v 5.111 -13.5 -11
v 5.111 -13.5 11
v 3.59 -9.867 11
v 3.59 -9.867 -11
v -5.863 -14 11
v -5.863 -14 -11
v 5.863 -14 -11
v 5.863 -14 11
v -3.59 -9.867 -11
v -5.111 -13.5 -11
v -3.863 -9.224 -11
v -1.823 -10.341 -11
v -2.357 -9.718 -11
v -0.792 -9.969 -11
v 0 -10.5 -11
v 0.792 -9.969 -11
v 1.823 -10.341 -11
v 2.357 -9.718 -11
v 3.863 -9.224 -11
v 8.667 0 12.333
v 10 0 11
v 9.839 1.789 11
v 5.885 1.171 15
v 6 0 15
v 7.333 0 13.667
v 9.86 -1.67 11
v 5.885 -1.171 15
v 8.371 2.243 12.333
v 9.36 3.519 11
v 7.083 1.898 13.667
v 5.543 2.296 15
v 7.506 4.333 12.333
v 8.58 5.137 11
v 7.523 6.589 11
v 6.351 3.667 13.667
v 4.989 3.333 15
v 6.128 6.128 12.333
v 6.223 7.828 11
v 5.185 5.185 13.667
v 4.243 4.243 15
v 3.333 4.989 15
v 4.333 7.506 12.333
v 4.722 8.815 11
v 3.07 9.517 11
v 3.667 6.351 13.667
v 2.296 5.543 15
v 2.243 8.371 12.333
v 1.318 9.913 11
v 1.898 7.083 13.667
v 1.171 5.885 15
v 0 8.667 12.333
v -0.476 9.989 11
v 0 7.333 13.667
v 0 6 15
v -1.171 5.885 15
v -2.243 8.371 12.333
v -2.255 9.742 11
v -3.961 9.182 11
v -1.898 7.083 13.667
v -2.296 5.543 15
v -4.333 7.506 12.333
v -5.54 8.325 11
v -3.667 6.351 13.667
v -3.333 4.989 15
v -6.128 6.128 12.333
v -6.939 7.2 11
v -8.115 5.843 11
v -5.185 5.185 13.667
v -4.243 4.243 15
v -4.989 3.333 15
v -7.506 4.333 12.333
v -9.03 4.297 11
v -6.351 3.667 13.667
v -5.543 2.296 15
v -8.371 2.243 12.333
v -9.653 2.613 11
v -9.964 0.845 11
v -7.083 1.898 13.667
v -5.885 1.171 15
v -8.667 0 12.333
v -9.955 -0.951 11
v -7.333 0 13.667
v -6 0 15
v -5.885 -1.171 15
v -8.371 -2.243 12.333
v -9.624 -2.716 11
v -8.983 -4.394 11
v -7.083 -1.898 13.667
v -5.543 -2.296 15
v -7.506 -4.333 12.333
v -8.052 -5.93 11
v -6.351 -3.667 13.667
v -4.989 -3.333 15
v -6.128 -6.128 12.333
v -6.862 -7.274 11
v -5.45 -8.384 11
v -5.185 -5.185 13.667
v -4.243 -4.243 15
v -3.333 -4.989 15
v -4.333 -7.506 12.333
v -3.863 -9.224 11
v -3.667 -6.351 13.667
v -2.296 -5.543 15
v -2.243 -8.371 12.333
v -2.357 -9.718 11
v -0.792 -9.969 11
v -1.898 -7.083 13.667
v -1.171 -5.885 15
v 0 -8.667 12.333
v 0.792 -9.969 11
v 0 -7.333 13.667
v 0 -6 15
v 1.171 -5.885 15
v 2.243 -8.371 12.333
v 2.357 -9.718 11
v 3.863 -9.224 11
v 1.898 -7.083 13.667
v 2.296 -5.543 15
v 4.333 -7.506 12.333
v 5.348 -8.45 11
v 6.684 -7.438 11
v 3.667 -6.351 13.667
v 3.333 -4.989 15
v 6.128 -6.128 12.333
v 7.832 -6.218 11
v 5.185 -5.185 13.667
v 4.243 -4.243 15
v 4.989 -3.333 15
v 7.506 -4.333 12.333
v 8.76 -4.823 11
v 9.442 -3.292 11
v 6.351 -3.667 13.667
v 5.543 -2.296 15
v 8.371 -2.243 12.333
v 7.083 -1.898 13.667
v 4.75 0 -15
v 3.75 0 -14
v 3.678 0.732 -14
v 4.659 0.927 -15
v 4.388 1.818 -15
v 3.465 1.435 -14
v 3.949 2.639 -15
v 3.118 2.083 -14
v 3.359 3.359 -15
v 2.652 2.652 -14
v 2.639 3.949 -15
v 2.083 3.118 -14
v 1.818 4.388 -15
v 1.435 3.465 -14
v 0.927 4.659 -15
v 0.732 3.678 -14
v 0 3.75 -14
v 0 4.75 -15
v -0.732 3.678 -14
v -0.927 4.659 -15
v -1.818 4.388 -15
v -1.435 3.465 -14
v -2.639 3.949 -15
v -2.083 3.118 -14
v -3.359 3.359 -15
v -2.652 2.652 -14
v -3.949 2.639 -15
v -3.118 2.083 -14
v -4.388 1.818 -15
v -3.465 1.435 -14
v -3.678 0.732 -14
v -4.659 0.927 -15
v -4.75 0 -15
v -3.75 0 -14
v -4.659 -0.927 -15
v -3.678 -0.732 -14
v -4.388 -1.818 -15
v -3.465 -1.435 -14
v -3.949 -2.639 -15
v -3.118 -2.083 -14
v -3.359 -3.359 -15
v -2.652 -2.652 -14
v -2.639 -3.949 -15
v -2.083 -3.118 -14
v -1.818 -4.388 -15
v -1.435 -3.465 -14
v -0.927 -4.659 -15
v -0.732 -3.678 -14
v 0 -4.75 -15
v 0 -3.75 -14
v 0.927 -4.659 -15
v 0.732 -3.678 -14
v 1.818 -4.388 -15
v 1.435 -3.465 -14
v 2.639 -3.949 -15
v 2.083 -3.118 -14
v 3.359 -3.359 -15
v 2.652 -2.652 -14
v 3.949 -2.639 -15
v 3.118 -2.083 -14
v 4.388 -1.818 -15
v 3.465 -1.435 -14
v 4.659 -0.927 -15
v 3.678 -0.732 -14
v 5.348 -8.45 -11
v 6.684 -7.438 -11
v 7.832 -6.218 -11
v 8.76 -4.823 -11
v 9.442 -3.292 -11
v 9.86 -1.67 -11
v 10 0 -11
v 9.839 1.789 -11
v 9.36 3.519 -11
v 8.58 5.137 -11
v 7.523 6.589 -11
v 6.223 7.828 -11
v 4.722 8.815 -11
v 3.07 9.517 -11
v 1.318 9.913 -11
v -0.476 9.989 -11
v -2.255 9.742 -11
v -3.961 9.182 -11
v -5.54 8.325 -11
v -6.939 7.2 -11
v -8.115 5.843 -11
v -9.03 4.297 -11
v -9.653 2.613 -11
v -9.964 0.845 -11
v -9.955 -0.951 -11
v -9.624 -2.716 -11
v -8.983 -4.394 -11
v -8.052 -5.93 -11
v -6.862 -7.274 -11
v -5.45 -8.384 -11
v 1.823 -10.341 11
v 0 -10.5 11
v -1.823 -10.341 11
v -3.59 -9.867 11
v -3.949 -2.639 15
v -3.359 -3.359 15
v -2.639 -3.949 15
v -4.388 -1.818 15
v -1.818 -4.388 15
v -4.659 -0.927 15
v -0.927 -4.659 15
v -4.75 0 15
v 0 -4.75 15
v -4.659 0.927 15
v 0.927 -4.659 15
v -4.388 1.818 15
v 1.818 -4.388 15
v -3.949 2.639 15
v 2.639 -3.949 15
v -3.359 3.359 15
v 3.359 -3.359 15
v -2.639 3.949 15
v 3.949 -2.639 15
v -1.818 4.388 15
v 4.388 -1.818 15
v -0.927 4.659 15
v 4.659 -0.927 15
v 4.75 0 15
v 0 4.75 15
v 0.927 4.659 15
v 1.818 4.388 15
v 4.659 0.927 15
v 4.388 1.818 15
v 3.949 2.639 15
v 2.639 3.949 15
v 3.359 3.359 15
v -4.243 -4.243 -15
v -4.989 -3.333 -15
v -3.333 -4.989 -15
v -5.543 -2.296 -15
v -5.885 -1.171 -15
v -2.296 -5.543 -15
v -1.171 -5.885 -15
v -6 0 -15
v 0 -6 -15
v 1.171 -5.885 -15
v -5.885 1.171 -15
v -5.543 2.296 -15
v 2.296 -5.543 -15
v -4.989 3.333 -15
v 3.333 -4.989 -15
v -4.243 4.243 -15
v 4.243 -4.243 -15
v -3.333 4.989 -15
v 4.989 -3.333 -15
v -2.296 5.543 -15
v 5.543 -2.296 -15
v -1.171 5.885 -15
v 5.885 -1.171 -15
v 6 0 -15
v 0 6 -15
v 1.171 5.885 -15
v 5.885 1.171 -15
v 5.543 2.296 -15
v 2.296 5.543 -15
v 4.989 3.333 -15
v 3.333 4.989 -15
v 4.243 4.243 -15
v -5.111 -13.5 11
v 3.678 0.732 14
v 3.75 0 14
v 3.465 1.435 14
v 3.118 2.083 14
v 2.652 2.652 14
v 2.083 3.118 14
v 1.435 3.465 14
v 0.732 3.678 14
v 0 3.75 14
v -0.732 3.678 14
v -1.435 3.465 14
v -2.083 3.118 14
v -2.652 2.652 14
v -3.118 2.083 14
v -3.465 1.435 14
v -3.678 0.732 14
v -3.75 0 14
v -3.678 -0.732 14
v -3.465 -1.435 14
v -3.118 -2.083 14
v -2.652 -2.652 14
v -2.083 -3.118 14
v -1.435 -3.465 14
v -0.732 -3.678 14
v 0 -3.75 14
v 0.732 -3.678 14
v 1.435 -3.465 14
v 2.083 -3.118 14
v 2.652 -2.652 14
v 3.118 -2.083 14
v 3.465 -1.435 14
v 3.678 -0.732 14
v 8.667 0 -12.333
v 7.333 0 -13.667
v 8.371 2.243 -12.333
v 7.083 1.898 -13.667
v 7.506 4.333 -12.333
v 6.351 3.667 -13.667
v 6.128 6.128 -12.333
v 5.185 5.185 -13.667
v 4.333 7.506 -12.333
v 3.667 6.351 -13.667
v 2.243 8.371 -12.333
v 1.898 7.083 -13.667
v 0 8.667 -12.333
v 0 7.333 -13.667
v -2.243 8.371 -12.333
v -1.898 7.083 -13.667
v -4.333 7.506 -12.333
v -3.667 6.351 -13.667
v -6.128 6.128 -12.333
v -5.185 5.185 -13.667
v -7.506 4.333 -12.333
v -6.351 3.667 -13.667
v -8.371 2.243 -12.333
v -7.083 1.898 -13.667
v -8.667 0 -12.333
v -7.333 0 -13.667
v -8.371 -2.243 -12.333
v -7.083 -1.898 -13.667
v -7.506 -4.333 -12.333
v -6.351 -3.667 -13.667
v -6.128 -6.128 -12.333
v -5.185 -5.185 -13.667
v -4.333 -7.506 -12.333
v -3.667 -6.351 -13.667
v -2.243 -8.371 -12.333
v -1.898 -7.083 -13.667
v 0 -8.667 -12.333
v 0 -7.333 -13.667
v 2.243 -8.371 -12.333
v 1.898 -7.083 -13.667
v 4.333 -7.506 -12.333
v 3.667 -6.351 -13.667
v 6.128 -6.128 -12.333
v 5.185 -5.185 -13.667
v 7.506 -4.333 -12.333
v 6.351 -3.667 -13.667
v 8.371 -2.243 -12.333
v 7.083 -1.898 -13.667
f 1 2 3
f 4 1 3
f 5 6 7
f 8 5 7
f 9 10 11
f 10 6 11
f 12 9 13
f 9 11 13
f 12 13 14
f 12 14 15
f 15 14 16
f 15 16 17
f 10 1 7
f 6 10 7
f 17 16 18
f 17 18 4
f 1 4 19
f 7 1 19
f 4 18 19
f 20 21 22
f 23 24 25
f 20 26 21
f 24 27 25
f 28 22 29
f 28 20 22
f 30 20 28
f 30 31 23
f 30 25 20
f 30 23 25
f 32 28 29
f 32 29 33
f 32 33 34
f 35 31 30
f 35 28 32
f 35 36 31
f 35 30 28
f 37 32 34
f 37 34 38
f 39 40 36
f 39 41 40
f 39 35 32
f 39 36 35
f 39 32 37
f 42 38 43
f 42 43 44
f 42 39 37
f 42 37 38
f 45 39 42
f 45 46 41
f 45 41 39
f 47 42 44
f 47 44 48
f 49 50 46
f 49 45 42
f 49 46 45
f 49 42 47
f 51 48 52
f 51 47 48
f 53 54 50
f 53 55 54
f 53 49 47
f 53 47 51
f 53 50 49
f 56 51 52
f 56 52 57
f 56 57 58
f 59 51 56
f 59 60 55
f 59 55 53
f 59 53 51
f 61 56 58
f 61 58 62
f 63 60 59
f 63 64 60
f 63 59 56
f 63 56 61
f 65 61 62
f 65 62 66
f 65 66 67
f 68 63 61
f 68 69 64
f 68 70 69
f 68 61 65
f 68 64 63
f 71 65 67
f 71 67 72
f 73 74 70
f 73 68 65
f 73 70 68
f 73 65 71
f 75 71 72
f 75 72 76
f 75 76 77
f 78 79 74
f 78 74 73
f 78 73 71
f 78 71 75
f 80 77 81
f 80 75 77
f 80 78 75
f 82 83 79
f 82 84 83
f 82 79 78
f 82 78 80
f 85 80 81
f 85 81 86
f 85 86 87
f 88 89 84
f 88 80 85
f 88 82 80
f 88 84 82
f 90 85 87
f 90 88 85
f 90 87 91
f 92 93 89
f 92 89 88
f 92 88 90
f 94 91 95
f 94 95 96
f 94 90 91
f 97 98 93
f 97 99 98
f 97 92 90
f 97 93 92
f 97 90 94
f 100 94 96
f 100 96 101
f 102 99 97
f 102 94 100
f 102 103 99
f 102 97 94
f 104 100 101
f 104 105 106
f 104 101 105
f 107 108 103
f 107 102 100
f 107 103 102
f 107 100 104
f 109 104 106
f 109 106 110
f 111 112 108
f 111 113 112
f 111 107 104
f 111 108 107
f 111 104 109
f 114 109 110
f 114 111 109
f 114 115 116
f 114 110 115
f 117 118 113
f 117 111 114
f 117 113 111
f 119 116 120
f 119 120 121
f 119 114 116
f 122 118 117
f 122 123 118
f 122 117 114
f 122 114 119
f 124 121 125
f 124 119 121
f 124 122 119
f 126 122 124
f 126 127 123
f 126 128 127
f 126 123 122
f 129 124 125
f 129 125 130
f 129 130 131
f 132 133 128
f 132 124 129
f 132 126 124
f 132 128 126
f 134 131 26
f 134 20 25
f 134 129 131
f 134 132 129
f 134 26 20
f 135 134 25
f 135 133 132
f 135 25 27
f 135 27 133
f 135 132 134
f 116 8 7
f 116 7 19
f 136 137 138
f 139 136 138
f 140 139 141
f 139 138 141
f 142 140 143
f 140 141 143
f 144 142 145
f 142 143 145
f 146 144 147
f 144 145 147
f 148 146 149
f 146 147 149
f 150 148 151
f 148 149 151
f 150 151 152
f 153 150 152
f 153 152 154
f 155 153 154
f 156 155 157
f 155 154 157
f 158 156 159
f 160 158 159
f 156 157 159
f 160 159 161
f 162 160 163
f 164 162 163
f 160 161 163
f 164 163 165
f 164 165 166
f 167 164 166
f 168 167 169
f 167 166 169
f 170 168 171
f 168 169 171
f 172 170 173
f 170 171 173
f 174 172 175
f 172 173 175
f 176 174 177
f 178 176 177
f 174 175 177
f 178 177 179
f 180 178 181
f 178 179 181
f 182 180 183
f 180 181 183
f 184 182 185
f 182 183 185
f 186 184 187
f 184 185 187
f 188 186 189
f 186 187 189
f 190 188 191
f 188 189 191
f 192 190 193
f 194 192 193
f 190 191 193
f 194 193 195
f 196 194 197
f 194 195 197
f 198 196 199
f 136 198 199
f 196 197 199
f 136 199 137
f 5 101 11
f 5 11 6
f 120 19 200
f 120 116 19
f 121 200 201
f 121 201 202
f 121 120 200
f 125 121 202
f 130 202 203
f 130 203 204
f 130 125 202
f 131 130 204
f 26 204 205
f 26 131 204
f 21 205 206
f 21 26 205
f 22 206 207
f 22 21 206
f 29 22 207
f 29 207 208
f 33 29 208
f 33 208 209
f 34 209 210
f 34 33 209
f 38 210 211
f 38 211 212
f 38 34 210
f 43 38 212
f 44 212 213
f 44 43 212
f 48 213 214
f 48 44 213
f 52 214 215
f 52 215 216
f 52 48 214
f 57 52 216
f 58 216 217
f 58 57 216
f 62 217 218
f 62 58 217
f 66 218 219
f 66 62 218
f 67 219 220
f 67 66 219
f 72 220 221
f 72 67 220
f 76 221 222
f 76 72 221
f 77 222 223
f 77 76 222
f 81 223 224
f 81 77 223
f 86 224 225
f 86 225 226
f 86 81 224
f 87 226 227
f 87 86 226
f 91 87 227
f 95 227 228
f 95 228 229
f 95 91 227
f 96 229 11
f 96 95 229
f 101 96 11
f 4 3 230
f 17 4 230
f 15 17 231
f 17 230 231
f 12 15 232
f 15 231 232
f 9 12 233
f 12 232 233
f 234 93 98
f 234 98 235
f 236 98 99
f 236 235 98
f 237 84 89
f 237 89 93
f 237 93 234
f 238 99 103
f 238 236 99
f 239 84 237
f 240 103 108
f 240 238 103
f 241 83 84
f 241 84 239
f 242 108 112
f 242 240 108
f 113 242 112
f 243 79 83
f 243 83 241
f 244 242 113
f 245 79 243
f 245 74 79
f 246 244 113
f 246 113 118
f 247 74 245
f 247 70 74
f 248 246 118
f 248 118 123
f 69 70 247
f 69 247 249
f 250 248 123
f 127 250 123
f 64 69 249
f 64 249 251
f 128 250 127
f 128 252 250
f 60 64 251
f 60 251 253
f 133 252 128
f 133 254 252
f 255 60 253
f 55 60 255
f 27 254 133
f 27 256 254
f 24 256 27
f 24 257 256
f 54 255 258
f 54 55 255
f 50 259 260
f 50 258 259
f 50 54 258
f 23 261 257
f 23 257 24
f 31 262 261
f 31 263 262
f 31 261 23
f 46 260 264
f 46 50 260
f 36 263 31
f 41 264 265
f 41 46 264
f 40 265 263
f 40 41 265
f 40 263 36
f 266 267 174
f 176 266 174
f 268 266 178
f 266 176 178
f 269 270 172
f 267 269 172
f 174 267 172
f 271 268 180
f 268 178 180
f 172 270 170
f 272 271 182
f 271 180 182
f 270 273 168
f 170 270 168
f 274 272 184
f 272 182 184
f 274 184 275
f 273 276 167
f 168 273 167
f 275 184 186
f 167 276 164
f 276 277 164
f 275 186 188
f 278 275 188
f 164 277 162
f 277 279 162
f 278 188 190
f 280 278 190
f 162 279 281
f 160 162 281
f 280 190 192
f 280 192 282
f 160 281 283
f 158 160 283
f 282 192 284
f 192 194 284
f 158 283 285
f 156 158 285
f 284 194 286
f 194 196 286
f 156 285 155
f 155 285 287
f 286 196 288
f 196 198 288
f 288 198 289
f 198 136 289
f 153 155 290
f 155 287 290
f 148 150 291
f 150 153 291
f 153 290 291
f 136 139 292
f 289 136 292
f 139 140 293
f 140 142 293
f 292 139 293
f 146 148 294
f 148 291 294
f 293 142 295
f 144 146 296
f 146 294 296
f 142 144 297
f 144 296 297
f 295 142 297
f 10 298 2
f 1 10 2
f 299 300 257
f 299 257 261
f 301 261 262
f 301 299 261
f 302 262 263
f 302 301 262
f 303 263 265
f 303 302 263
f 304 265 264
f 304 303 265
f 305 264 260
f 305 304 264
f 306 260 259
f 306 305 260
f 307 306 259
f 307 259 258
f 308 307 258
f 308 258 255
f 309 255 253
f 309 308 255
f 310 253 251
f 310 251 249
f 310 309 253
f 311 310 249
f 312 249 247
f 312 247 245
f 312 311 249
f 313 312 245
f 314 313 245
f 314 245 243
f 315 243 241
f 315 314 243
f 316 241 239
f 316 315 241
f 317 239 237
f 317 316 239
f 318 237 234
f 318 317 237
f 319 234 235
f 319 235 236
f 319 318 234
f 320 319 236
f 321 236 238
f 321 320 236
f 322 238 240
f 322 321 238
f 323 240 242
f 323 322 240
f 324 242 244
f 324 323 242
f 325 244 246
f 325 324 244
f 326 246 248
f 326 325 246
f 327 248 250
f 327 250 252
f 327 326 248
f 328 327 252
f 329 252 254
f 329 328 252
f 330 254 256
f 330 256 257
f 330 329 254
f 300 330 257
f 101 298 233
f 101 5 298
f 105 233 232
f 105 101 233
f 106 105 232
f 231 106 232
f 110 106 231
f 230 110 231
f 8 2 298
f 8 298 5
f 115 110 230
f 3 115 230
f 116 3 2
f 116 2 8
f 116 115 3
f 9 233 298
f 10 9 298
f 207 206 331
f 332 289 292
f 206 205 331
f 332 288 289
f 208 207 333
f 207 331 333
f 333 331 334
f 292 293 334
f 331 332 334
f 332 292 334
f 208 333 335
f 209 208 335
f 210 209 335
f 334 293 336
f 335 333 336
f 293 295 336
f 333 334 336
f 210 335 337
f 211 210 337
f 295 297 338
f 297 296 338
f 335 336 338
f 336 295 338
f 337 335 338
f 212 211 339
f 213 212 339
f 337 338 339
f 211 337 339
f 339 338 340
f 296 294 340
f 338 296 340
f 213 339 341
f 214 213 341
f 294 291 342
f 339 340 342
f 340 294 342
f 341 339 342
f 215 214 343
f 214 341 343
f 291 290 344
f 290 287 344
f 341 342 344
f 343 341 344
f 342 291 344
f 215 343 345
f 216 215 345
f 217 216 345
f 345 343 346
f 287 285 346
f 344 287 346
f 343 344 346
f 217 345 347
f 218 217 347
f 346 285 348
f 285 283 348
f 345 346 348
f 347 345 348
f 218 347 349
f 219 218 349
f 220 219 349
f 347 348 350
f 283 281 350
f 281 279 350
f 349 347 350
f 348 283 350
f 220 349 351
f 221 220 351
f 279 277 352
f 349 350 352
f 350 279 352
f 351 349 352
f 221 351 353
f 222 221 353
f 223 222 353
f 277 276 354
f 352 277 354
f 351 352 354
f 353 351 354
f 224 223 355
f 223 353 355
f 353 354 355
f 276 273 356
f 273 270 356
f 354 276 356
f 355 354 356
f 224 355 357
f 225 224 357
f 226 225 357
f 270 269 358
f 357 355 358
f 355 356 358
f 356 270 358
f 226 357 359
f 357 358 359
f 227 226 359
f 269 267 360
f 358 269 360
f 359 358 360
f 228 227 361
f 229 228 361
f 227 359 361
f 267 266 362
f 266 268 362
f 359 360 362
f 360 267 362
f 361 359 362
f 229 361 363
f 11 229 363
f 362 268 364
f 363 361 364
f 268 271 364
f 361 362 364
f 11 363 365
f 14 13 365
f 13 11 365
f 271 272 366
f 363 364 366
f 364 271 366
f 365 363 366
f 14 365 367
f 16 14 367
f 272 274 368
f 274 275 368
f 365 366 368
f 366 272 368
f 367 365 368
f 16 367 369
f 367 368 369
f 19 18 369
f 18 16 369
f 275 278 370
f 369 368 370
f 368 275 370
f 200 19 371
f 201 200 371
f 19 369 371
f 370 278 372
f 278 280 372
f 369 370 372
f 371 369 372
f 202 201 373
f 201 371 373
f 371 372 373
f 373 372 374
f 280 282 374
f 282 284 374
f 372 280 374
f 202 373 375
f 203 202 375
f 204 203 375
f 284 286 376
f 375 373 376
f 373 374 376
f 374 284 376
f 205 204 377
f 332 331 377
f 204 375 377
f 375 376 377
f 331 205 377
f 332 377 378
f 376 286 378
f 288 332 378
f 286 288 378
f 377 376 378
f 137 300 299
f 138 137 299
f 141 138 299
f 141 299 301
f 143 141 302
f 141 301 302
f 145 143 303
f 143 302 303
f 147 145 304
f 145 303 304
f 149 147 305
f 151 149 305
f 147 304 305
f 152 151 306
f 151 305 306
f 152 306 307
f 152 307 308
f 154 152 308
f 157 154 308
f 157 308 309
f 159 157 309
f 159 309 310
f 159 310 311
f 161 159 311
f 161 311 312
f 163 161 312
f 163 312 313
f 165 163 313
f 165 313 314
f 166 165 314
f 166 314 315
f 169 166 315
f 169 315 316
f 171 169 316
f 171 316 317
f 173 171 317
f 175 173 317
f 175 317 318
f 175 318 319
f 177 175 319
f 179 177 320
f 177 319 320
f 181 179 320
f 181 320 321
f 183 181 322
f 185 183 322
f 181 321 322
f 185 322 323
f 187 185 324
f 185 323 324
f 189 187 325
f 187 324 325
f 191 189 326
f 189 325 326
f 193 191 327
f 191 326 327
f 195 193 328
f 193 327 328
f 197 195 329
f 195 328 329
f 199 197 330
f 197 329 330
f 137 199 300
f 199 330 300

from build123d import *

# Parameters (mm, degrees)
SKETCH1_R           = 10
BOSS_EXTRUDE1_DEPTH = 15
CHAMFER1_SIZE       = 4
SKETCH2_R           = 3.75
CUT_EXTRUDE1_DEPTH  = 34.166247904
CHAMFER2_SIZE       = 1
BOSS_EXTRUDE2_DEPTH = 22


with BuildPart() as part:
    # Sketch1 → Boss-Extrude1 (new, symmetric)
    with BuildSketch(Plane.XY):
        Circle(SKETCH1_R)
    extrude(amount=BOSS_EXTRUDE1_DEPTH, both=True)

    # Chamfer1
    chamfer1_edges = [part.edges().sort_by_distance(p)[0] for p in [
        (-10, 0, -15),
        (-10, 0, 15),
    ]]
    chamfer(chamfer1_edges, length=CHAMFER1_SIZE)

    # Sketch2 → Cut-Extrude1 (cut, through all)
    with BuildSketch(Plane.XY.offset(15)):
        Circle(SKETCH2_R)
    extrude(amount=-CUT_EXTRUDE1_DEPTH, mode=Mode.SUBTRACT)

    # Chamfer2
    chamfer2_edges = [part.edges().sort_by_distance(p)[0] for p in [
        (-3.75, 0, -15),
        (-3.75, 0, 15),
    ]]
    chamfer(chamfer2_edges, length=CHAMFER2_SIZE)

    # Sketch3 → Boss-Extrude2 (add)
    with BuildSketch(Plane.XY.offset(11)):
        with BuildLine():
            Line((-3.862549243, -9.223920714), (-5.862549243, -14))
            Line((-5.862549243, -14), (5.862549243, -14))
            Line((5.862549243, -14), (3.862549243, -9.223920714))
            ThreePointArc((3.862549243, -9.223920714), (0, -10), (-3.862549243, -9.223920714))
        make_face()
        with BuildLine():
            Line((-3.589879787, -9.867257122), (-5.111103644, -13.5))
            Line((-5.111103644, -13.5), (5.111103644, -13.5))
            Line((5.111103644, -13.5), (3.589879787, -9.867257122))
            ThreePointArc((3.589879787, -9.867257122), (0, -10.5), (-3.589879787, -9.867257122))
        make_face(mode=Mode.SUBTRACT)
    extrude(amount=-BOSS_EXTRUDE2_DEPTH)


solid = part.part
